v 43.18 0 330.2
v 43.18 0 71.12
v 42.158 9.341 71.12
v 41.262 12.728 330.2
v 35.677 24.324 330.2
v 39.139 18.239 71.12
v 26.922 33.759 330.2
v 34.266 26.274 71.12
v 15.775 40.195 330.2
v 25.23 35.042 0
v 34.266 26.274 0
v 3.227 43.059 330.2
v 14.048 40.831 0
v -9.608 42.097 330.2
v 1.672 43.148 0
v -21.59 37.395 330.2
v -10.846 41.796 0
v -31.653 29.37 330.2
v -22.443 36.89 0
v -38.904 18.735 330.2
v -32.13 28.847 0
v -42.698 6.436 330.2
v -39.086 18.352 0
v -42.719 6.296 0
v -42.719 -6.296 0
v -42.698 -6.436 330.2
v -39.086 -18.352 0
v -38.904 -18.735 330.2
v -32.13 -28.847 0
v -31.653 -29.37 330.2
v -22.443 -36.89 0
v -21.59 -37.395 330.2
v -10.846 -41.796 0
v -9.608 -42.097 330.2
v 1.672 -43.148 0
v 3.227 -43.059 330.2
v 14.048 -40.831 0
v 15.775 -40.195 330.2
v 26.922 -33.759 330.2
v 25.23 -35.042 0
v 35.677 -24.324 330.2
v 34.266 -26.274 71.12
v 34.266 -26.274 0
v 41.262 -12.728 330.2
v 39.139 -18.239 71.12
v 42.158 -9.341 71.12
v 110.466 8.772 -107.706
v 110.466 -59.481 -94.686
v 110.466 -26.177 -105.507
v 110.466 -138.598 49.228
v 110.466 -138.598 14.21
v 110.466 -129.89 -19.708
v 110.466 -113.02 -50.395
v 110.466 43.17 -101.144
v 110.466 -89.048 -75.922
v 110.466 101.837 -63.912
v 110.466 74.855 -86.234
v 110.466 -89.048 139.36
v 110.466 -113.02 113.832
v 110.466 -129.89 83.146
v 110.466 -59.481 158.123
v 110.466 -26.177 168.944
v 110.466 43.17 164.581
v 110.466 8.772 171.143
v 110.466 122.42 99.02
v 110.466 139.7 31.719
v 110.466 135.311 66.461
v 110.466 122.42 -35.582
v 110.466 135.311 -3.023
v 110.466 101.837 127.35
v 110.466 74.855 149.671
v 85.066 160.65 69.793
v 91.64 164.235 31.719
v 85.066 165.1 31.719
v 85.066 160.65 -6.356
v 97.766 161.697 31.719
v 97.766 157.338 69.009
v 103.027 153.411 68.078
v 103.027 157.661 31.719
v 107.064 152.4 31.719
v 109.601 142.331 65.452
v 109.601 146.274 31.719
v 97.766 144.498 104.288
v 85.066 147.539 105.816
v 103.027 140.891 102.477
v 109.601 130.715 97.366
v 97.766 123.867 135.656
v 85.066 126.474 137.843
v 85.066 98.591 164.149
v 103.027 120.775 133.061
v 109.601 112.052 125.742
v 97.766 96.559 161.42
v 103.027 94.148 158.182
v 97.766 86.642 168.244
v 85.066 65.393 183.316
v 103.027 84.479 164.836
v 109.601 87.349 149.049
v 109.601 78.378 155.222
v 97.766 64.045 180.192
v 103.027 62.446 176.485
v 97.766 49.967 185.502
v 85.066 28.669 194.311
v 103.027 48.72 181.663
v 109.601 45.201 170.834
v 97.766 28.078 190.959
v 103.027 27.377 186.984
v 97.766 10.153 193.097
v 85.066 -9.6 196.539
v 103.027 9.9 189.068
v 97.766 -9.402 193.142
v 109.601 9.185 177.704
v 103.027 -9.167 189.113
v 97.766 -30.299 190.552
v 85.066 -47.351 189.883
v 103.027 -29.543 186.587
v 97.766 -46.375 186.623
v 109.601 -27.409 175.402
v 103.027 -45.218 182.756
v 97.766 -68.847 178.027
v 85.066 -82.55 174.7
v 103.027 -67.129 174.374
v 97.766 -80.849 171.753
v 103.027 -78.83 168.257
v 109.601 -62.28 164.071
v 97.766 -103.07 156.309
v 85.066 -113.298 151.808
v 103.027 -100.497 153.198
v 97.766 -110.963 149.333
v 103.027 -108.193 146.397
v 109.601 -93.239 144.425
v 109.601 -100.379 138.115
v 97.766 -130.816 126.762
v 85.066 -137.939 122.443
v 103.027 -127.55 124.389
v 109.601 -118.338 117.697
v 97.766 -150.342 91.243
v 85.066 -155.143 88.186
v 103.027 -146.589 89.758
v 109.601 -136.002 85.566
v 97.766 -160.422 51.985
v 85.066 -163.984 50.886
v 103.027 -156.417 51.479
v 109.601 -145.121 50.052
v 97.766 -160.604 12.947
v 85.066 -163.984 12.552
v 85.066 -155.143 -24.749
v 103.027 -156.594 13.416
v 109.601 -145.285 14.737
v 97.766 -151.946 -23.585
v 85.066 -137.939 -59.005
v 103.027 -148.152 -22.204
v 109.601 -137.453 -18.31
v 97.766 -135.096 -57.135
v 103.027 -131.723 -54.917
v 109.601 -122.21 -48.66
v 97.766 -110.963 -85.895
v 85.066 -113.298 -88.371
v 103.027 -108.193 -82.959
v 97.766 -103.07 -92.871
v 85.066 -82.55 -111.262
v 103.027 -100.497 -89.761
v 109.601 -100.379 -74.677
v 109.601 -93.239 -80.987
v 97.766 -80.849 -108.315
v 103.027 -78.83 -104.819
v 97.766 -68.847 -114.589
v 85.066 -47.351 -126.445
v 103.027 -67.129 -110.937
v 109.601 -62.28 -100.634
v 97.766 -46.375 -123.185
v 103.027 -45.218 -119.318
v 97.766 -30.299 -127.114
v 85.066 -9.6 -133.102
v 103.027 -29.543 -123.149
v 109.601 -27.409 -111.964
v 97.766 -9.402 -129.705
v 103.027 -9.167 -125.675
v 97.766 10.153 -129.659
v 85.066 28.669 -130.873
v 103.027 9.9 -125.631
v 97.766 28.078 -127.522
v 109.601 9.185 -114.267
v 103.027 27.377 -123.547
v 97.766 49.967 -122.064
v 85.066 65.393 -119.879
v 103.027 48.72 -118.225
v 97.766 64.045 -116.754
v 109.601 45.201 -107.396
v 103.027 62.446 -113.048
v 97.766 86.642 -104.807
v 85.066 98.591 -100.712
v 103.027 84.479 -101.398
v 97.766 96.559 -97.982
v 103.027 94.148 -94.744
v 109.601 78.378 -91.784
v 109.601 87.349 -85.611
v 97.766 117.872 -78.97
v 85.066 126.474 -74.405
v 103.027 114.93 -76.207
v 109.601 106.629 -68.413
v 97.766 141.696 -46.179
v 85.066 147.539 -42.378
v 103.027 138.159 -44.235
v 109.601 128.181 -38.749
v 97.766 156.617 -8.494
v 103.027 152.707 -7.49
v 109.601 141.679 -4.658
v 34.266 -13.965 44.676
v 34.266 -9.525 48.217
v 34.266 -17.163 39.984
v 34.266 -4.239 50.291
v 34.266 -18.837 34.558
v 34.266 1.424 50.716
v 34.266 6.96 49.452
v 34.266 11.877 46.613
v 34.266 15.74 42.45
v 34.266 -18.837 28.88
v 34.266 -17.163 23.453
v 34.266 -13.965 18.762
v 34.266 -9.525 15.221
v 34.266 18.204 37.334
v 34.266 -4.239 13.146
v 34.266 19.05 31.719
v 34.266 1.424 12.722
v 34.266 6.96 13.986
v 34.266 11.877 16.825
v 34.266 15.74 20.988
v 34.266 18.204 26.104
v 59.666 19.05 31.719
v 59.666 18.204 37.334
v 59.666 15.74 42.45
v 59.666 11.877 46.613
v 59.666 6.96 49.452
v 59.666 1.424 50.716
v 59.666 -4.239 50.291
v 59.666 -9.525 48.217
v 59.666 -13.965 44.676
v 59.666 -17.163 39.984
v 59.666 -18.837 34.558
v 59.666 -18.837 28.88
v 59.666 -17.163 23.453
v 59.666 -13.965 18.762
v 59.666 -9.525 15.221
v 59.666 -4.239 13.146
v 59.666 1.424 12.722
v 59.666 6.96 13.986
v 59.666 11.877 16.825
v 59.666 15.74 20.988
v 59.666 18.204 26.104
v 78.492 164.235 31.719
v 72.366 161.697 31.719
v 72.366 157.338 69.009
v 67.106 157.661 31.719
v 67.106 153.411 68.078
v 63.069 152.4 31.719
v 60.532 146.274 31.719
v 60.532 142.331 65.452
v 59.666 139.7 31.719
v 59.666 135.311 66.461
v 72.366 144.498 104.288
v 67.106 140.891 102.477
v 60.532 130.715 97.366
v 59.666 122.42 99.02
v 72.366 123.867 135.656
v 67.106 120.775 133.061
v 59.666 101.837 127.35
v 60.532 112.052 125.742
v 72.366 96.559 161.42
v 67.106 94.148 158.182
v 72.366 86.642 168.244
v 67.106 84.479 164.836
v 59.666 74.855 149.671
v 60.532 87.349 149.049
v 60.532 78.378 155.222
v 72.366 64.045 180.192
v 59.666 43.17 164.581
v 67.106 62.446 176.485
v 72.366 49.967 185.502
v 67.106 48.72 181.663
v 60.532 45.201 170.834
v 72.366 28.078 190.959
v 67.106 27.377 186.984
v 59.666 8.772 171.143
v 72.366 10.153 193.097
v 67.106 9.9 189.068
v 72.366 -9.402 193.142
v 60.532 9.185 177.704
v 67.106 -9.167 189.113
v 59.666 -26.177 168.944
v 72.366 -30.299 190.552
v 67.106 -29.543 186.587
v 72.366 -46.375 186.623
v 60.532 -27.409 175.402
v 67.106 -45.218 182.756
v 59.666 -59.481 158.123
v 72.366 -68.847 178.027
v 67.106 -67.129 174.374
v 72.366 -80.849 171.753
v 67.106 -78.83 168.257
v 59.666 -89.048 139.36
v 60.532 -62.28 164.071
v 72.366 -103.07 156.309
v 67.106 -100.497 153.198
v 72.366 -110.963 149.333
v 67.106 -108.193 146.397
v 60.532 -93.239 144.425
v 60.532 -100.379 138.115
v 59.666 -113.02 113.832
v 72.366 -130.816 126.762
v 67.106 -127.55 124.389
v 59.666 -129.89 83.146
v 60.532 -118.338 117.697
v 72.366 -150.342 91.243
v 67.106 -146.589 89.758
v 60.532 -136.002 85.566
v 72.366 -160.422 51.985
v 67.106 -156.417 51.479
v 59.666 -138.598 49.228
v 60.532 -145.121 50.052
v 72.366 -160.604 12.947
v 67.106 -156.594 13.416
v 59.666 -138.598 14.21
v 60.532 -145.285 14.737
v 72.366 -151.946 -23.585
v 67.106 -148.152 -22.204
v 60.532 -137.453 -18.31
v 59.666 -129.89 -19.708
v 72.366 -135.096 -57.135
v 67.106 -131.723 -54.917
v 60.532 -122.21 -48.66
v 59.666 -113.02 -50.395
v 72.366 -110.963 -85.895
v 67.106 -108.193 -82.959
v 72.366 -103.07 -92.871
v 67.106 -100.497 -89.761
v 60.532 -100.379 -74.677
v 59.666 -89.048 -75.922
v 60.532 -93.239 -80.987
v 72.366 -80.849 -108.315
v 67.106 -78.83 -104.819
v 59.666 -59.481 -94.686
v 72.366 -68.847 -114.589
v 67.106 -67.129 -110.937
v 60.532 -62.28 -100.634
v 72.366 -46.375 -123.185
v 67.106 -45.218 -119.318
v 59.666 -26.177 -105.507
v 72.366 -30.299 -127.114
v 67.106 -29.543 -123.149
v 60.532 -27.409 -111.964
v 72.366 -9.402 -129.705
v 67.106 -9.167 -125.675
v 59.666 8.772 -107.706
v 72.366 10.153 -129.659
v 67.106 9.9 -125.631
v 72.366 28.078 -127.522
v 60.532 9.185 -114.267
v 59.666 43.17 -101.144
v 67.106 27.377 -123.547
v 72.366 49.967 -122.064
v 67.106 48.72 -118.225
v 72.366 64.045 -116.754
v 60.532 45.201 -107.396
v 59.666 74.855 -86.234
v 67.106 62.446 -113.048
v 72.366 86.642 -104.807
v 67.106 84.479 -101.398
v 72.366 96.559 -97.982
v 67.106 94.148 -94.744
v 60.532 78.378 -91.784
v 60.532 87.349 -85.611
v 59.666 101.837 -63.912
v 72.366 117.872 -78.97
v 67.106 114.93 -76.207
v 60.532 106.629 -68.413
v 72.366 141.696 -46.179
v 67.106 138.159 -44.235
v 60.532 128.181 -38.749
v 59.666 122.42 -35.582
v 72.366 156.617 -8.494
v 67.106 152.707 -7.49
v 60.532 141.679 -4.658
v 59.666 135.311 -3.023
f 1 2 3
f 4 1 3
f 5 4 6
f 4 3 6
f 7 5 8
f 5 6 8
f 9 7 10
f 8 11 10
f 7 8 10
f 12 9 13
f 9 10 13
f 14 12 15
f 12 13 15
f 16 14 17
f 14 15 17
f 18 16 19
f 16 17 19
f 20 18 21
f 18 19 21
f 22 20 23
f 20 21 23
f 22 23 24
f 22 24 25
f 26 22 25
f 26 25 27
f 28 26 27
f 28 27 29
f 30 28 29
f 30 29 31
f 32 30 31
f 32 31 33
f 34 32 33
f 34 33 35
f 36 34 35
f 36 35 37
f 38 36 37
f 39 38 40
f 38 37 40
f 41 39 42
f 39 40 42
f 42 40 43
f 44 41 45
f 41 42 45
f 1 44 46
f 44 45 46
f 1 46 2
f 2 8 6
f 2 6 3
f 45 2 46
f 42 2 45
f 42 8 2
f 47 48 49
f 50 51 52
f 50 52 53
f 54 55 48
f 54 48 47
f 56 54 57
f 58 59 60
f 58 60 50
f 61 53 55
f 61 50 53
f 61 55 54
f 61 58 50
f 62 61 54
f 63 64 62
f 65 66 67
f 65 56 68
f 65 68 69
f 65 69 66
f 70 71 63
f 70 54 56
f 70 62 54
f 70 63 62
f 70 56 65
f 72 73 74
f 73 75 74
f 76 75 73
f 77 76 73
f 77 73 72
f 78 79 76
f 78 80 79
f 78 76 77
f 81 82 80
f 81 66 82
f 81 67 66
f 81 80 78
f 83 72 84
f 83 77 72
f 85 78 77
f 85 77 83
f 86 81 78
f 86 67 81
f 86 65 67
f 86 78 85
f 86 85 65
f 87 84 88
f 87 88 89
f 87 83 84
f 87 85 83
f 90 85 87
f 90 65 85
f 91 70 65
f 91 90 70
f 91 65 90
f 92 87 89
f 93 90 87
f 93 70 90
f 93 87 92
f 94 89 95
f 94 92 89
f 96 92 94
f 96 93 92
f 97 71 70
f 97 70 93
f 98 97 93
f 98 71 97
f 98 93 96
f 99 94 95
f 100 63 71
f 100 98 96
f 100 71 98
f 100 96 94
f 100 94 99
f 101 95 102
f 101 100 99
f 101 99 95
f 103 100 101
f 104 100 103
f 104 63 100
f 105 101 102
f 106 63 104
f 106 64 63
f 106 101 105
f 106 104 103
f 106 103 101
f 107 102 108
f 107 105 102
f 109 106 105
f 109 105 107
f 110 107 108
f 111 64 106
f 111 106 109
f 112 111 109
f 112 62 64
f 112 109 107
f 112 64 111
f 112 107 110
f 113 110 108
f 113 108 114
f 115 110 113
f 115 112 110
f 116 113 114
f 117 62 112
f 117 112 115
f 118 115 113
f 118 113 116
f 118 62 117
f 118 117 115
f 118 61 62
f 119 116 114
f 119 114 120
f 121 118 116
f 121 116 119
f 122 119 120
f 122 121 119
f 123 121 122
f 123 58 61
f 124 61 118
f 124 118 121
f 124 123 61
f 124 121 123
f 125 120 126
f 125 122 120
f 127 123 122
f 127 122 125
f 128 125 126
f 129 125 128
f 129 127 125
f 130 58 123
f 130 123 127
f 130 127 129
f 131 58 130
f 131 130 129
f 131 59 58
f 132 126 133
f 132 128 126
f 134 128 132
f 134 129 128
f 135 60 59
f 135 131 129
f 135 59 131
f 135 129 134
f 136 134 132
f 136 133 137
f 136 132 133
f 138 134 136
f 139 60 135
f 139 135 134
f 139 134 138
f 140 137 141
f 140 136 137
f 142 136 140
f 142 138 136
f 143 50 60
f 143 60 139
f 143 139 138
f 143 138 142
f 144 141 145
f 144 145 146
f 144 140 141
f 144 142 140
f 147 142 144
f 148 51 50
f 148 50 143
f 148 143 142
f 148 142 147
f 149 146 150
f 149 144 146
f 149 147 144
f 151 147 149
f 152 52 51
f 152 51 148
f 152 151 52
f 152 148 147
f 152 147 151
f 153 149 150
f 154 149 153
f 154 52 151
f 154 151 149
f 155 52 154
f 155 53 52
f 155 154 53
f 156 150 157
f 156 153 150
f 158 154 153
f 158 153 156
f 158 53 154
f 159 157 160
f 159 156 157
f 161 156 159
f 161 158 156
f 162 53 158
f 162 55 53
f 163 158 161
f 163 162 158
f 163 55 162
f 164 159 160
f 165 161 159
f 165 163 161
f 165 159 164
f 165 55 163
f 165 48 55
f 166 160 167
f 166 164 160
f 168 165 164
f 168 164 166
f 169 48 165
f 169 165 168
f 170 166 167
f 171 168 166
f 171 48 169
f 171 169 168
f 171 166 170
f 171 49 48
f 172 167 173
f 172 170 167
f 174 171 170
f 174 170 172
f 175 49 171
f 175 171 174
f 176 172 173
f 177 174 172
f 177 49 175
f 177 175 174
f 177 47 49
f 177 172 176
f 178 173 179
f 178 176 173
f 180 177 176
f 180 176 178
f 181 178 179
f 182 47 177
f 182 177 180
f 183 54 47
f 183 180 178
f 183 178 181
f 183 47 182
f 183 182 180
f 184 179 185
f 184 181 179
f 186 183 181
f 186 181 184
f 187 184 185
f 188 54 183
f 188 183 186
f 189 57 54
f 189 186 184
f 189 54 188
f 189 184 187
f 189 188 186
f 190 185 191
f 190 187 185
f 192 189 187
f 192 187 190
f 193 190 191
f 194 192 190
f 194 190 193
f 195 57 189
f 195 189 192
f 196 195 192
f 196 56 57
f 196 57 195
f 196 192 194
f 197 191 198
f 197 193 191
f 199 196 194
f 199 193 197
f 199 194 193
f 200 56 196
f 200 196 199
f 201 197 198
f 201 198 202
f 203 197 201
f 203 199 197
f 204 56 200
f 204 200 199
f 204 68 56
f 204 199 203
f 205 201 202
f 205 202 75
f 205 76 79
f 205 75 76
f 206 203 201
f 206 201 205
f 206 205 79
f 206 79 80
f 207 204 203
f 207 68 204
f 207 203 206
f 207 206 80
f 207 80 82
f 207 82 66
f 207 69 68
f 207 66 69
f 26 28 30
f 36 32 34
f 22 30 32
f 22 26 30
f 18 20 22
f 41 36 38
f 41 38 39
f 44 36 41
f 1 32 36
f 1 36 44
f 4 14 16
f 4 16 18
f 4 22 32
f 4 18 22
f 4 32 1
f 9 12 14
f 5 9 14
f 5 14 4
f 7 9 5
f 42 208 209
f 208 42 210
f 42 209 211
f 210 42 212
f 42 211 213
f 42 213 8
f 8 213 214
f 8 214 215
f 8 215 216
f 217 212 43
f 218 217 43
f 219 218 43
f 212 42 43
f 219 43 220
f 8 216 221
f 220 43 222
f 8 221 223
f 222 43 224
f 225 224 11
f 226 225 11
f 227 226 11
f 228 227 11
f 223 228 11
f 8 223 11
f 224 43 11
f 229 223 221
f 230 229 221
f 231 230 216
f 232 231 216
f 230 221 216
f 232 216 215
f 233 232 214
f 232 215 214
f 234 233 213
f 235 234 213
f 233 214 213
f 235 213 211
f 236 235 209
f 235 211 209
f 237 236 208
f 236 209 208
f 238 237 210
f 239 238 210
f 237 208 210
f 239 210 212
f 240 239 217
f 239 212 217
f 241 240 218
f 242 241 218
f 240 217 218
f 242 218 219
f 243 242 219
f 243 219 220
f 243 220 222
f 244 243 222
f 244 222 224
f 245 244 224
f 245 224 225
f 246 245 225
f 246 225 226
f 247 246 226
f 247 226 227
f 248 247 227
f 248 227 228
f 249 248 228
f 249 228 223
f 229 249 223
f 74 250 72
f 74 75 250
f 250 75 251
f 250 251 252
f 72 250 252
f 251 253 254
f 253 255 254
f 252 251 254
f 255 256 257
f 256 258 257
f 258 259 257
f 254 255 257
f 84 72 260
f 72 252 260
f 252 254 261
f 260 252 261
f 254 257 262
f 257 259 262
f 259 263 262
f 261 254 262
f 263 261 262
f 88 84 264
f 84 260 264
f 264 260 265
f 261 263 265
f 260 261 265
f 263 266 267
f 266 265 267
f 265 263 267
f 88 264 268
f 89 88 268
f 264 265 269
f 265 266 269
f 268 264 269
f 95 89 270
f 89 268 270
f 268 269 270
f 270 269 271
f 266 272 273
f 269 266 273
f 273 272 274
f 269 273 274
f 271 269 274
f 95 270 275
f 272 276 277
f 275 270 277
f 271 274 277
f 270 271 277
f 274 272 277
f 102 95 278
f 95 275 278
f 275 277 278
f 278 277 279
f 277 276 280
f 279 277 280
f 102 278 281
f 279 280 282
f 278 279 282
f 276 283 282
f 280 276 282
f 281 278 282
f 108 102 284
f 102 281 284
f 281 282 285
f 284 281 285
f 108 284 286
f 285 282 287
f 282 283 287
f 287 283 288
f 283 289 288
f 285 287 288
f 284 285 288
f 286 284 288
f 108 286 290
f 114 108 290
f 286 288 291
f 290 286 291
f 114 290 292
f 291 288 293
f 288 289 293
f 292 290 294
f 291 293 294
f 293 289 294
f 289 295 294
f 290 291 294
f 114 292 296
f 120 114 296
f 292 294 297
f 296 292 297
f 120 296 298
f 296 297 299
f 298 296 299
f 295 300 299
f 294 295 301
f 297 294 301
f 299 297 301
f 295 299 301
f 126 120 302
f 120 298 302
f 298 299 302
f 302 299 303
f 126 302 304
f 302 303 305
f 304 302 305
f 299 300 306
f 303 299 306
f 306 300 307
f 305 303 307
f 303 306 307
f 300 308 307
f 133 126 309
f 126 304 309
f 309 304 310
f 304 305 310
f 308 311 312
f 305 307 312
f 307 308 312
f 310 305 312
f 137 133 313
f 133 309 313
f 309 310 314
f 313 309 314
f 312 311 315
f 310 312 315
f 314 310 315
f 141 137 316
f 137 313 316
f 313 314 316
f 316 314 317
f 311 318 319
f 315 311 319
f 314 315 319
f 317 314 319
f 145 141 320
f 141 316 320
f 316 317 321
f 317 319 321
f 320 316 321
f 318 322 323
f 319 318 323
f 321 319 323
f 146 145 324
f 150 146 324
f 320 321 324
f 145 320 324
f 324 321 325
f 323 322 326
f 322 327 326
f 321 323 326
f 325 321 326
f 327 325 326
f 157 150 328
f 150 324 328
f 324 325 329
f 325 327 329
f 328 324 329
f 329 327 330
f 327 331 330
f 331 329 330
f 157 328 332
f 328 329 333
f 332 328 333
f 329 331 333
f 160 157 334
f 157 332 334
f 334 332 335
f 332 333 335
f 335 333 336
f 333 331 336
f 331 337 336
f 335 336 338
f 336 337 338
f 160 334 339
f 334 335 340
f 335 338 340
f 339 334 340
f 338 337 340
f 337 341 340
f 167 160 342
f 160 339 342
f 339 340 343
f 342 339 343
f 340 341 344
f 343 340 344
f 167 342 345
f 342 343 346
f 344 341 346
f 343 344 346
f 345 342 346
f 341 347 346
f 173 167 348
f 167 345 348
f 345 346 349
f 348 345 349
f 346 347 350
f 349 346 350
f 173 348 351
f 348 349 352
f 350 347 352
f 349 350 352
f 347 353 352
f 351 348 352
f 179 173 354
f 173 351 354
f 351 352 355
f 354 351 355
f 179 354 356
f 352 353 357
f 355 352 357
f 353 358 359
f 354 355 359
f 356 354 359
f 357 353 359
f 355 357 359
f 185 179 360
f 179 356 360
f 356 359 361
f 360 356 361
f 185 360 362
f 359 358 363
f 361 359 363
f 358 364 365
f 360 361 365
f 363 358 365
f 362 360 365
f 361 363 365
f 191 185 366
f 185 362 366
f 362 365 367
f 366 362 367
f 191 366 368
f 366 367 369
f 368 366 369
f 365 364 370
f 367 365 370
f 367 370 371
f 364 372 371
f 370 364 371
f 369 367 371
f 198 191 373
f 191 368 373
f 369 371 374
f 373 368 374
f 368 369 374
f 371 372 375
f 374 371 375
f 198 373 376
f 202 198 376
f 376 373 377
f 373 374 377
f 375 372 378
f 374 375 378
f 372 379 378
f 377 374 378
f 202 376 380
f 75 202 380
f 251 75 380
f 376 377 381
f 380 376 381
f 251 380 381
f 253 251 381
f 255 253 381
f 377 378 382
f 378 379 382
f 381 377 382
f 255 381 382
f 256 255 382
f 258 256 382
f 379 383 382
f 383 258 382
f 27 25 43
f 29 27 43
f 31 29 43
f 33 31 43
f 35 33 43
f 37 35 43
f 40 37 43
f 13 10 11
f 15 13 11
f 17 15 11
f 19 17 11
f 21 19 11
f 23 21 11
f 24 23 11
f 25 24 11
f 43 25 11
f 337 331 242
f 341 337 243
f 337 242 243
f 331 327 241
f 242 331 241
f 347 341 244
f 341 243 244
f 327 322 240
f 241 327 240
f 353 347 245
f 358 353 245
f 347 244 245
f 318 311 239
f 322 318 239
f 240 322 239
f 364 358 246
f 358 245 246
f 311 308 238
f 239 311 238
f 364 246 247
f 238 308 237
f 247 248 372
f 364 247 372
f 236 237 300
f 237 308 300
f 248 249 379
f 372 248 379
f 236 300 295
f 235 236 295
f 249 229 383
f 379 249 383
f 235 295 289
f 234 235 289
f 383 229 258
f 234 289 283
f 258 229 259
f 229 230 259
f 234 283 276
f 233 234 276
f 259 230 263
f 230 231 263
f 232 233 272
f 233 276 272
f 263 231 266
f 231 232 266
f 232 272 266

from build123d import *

# Parameters (mm, degrees)
F0_R     = 43.18
F1_DEPTH = 330.2
F3_DEPTH = 71.12
F4_R     = 19.05
F5_DEPTH = 76.2
F6_R     = 165.1
F6_R_2   = 19.05
F7_DEPTH = 50.8
F8_R     = 25.39999


# Not quite as in the source:
# - a fillet or chamfer is up to 0.001 mm smaller than in the source, because OpenCascade refuses the exact size


with BuildPart() as f1:
    # F0 (on Top) → F1 (new body)
    with BuildSketch(Plane.XY):
        Circle(F0_R)
    extrude(amount=F1_DEPTH)

    # F2 (on face) → F3 (cut)
    with BuildSketch(Plane(origin=(0, 0, 0), x_dir=(1, 0, 0), z_dir=(0, 0, -1))):
        with BuildLine():
            ThreePointArc((43.18, 0), (40.8909417637, 13.8723927885), (34.2664621733, 26.2739789549))
            Line((34.2664621733, 26.2739789549), (34.2664621733, -26.2739789549))
            ThreePointArc((34.2664621733, -26.2739789549), (40.8909417637, -13.8723927885), (43.18, 0))
        make_face()
    extrude(amount=-F3_DEPTH, mode=Mode.SUBTRACT)

    # F4 (on face) → F5 (join)
    with BuildSketch(Plane.YZ.offset(34.2664621733)):
        with Locations((0, 31.7187957861)):
            Circle(F4_R)
    extrude(amount=F5_DEPTH)

    # F6 (on face) → F7 (join)
    with BuildSketch(Plane.YZ.offset(110.4664621733)):
        with Locations((0, 31.7187957861)):
            Circle(F6_R)
        with Locations((0, 31.7187957861)):
            Circle(F6_R_2, mode=Mode.SUBTRACT)
    extrude(amount=-F7_DEPTH)

    # F8 (radius 25.4 in the source; OpenCascade refuses exactly that, so slightly less here)
    f8_edges = [f1.edges().sort_by_distance(p)[0] for p in [
        (110.466462, -165.1, 31.718796),
        (59.666462, -165.1, 31.718796),
    ]]
    fillet(f8_edges, radius=F8_R)


solid = f1.part
